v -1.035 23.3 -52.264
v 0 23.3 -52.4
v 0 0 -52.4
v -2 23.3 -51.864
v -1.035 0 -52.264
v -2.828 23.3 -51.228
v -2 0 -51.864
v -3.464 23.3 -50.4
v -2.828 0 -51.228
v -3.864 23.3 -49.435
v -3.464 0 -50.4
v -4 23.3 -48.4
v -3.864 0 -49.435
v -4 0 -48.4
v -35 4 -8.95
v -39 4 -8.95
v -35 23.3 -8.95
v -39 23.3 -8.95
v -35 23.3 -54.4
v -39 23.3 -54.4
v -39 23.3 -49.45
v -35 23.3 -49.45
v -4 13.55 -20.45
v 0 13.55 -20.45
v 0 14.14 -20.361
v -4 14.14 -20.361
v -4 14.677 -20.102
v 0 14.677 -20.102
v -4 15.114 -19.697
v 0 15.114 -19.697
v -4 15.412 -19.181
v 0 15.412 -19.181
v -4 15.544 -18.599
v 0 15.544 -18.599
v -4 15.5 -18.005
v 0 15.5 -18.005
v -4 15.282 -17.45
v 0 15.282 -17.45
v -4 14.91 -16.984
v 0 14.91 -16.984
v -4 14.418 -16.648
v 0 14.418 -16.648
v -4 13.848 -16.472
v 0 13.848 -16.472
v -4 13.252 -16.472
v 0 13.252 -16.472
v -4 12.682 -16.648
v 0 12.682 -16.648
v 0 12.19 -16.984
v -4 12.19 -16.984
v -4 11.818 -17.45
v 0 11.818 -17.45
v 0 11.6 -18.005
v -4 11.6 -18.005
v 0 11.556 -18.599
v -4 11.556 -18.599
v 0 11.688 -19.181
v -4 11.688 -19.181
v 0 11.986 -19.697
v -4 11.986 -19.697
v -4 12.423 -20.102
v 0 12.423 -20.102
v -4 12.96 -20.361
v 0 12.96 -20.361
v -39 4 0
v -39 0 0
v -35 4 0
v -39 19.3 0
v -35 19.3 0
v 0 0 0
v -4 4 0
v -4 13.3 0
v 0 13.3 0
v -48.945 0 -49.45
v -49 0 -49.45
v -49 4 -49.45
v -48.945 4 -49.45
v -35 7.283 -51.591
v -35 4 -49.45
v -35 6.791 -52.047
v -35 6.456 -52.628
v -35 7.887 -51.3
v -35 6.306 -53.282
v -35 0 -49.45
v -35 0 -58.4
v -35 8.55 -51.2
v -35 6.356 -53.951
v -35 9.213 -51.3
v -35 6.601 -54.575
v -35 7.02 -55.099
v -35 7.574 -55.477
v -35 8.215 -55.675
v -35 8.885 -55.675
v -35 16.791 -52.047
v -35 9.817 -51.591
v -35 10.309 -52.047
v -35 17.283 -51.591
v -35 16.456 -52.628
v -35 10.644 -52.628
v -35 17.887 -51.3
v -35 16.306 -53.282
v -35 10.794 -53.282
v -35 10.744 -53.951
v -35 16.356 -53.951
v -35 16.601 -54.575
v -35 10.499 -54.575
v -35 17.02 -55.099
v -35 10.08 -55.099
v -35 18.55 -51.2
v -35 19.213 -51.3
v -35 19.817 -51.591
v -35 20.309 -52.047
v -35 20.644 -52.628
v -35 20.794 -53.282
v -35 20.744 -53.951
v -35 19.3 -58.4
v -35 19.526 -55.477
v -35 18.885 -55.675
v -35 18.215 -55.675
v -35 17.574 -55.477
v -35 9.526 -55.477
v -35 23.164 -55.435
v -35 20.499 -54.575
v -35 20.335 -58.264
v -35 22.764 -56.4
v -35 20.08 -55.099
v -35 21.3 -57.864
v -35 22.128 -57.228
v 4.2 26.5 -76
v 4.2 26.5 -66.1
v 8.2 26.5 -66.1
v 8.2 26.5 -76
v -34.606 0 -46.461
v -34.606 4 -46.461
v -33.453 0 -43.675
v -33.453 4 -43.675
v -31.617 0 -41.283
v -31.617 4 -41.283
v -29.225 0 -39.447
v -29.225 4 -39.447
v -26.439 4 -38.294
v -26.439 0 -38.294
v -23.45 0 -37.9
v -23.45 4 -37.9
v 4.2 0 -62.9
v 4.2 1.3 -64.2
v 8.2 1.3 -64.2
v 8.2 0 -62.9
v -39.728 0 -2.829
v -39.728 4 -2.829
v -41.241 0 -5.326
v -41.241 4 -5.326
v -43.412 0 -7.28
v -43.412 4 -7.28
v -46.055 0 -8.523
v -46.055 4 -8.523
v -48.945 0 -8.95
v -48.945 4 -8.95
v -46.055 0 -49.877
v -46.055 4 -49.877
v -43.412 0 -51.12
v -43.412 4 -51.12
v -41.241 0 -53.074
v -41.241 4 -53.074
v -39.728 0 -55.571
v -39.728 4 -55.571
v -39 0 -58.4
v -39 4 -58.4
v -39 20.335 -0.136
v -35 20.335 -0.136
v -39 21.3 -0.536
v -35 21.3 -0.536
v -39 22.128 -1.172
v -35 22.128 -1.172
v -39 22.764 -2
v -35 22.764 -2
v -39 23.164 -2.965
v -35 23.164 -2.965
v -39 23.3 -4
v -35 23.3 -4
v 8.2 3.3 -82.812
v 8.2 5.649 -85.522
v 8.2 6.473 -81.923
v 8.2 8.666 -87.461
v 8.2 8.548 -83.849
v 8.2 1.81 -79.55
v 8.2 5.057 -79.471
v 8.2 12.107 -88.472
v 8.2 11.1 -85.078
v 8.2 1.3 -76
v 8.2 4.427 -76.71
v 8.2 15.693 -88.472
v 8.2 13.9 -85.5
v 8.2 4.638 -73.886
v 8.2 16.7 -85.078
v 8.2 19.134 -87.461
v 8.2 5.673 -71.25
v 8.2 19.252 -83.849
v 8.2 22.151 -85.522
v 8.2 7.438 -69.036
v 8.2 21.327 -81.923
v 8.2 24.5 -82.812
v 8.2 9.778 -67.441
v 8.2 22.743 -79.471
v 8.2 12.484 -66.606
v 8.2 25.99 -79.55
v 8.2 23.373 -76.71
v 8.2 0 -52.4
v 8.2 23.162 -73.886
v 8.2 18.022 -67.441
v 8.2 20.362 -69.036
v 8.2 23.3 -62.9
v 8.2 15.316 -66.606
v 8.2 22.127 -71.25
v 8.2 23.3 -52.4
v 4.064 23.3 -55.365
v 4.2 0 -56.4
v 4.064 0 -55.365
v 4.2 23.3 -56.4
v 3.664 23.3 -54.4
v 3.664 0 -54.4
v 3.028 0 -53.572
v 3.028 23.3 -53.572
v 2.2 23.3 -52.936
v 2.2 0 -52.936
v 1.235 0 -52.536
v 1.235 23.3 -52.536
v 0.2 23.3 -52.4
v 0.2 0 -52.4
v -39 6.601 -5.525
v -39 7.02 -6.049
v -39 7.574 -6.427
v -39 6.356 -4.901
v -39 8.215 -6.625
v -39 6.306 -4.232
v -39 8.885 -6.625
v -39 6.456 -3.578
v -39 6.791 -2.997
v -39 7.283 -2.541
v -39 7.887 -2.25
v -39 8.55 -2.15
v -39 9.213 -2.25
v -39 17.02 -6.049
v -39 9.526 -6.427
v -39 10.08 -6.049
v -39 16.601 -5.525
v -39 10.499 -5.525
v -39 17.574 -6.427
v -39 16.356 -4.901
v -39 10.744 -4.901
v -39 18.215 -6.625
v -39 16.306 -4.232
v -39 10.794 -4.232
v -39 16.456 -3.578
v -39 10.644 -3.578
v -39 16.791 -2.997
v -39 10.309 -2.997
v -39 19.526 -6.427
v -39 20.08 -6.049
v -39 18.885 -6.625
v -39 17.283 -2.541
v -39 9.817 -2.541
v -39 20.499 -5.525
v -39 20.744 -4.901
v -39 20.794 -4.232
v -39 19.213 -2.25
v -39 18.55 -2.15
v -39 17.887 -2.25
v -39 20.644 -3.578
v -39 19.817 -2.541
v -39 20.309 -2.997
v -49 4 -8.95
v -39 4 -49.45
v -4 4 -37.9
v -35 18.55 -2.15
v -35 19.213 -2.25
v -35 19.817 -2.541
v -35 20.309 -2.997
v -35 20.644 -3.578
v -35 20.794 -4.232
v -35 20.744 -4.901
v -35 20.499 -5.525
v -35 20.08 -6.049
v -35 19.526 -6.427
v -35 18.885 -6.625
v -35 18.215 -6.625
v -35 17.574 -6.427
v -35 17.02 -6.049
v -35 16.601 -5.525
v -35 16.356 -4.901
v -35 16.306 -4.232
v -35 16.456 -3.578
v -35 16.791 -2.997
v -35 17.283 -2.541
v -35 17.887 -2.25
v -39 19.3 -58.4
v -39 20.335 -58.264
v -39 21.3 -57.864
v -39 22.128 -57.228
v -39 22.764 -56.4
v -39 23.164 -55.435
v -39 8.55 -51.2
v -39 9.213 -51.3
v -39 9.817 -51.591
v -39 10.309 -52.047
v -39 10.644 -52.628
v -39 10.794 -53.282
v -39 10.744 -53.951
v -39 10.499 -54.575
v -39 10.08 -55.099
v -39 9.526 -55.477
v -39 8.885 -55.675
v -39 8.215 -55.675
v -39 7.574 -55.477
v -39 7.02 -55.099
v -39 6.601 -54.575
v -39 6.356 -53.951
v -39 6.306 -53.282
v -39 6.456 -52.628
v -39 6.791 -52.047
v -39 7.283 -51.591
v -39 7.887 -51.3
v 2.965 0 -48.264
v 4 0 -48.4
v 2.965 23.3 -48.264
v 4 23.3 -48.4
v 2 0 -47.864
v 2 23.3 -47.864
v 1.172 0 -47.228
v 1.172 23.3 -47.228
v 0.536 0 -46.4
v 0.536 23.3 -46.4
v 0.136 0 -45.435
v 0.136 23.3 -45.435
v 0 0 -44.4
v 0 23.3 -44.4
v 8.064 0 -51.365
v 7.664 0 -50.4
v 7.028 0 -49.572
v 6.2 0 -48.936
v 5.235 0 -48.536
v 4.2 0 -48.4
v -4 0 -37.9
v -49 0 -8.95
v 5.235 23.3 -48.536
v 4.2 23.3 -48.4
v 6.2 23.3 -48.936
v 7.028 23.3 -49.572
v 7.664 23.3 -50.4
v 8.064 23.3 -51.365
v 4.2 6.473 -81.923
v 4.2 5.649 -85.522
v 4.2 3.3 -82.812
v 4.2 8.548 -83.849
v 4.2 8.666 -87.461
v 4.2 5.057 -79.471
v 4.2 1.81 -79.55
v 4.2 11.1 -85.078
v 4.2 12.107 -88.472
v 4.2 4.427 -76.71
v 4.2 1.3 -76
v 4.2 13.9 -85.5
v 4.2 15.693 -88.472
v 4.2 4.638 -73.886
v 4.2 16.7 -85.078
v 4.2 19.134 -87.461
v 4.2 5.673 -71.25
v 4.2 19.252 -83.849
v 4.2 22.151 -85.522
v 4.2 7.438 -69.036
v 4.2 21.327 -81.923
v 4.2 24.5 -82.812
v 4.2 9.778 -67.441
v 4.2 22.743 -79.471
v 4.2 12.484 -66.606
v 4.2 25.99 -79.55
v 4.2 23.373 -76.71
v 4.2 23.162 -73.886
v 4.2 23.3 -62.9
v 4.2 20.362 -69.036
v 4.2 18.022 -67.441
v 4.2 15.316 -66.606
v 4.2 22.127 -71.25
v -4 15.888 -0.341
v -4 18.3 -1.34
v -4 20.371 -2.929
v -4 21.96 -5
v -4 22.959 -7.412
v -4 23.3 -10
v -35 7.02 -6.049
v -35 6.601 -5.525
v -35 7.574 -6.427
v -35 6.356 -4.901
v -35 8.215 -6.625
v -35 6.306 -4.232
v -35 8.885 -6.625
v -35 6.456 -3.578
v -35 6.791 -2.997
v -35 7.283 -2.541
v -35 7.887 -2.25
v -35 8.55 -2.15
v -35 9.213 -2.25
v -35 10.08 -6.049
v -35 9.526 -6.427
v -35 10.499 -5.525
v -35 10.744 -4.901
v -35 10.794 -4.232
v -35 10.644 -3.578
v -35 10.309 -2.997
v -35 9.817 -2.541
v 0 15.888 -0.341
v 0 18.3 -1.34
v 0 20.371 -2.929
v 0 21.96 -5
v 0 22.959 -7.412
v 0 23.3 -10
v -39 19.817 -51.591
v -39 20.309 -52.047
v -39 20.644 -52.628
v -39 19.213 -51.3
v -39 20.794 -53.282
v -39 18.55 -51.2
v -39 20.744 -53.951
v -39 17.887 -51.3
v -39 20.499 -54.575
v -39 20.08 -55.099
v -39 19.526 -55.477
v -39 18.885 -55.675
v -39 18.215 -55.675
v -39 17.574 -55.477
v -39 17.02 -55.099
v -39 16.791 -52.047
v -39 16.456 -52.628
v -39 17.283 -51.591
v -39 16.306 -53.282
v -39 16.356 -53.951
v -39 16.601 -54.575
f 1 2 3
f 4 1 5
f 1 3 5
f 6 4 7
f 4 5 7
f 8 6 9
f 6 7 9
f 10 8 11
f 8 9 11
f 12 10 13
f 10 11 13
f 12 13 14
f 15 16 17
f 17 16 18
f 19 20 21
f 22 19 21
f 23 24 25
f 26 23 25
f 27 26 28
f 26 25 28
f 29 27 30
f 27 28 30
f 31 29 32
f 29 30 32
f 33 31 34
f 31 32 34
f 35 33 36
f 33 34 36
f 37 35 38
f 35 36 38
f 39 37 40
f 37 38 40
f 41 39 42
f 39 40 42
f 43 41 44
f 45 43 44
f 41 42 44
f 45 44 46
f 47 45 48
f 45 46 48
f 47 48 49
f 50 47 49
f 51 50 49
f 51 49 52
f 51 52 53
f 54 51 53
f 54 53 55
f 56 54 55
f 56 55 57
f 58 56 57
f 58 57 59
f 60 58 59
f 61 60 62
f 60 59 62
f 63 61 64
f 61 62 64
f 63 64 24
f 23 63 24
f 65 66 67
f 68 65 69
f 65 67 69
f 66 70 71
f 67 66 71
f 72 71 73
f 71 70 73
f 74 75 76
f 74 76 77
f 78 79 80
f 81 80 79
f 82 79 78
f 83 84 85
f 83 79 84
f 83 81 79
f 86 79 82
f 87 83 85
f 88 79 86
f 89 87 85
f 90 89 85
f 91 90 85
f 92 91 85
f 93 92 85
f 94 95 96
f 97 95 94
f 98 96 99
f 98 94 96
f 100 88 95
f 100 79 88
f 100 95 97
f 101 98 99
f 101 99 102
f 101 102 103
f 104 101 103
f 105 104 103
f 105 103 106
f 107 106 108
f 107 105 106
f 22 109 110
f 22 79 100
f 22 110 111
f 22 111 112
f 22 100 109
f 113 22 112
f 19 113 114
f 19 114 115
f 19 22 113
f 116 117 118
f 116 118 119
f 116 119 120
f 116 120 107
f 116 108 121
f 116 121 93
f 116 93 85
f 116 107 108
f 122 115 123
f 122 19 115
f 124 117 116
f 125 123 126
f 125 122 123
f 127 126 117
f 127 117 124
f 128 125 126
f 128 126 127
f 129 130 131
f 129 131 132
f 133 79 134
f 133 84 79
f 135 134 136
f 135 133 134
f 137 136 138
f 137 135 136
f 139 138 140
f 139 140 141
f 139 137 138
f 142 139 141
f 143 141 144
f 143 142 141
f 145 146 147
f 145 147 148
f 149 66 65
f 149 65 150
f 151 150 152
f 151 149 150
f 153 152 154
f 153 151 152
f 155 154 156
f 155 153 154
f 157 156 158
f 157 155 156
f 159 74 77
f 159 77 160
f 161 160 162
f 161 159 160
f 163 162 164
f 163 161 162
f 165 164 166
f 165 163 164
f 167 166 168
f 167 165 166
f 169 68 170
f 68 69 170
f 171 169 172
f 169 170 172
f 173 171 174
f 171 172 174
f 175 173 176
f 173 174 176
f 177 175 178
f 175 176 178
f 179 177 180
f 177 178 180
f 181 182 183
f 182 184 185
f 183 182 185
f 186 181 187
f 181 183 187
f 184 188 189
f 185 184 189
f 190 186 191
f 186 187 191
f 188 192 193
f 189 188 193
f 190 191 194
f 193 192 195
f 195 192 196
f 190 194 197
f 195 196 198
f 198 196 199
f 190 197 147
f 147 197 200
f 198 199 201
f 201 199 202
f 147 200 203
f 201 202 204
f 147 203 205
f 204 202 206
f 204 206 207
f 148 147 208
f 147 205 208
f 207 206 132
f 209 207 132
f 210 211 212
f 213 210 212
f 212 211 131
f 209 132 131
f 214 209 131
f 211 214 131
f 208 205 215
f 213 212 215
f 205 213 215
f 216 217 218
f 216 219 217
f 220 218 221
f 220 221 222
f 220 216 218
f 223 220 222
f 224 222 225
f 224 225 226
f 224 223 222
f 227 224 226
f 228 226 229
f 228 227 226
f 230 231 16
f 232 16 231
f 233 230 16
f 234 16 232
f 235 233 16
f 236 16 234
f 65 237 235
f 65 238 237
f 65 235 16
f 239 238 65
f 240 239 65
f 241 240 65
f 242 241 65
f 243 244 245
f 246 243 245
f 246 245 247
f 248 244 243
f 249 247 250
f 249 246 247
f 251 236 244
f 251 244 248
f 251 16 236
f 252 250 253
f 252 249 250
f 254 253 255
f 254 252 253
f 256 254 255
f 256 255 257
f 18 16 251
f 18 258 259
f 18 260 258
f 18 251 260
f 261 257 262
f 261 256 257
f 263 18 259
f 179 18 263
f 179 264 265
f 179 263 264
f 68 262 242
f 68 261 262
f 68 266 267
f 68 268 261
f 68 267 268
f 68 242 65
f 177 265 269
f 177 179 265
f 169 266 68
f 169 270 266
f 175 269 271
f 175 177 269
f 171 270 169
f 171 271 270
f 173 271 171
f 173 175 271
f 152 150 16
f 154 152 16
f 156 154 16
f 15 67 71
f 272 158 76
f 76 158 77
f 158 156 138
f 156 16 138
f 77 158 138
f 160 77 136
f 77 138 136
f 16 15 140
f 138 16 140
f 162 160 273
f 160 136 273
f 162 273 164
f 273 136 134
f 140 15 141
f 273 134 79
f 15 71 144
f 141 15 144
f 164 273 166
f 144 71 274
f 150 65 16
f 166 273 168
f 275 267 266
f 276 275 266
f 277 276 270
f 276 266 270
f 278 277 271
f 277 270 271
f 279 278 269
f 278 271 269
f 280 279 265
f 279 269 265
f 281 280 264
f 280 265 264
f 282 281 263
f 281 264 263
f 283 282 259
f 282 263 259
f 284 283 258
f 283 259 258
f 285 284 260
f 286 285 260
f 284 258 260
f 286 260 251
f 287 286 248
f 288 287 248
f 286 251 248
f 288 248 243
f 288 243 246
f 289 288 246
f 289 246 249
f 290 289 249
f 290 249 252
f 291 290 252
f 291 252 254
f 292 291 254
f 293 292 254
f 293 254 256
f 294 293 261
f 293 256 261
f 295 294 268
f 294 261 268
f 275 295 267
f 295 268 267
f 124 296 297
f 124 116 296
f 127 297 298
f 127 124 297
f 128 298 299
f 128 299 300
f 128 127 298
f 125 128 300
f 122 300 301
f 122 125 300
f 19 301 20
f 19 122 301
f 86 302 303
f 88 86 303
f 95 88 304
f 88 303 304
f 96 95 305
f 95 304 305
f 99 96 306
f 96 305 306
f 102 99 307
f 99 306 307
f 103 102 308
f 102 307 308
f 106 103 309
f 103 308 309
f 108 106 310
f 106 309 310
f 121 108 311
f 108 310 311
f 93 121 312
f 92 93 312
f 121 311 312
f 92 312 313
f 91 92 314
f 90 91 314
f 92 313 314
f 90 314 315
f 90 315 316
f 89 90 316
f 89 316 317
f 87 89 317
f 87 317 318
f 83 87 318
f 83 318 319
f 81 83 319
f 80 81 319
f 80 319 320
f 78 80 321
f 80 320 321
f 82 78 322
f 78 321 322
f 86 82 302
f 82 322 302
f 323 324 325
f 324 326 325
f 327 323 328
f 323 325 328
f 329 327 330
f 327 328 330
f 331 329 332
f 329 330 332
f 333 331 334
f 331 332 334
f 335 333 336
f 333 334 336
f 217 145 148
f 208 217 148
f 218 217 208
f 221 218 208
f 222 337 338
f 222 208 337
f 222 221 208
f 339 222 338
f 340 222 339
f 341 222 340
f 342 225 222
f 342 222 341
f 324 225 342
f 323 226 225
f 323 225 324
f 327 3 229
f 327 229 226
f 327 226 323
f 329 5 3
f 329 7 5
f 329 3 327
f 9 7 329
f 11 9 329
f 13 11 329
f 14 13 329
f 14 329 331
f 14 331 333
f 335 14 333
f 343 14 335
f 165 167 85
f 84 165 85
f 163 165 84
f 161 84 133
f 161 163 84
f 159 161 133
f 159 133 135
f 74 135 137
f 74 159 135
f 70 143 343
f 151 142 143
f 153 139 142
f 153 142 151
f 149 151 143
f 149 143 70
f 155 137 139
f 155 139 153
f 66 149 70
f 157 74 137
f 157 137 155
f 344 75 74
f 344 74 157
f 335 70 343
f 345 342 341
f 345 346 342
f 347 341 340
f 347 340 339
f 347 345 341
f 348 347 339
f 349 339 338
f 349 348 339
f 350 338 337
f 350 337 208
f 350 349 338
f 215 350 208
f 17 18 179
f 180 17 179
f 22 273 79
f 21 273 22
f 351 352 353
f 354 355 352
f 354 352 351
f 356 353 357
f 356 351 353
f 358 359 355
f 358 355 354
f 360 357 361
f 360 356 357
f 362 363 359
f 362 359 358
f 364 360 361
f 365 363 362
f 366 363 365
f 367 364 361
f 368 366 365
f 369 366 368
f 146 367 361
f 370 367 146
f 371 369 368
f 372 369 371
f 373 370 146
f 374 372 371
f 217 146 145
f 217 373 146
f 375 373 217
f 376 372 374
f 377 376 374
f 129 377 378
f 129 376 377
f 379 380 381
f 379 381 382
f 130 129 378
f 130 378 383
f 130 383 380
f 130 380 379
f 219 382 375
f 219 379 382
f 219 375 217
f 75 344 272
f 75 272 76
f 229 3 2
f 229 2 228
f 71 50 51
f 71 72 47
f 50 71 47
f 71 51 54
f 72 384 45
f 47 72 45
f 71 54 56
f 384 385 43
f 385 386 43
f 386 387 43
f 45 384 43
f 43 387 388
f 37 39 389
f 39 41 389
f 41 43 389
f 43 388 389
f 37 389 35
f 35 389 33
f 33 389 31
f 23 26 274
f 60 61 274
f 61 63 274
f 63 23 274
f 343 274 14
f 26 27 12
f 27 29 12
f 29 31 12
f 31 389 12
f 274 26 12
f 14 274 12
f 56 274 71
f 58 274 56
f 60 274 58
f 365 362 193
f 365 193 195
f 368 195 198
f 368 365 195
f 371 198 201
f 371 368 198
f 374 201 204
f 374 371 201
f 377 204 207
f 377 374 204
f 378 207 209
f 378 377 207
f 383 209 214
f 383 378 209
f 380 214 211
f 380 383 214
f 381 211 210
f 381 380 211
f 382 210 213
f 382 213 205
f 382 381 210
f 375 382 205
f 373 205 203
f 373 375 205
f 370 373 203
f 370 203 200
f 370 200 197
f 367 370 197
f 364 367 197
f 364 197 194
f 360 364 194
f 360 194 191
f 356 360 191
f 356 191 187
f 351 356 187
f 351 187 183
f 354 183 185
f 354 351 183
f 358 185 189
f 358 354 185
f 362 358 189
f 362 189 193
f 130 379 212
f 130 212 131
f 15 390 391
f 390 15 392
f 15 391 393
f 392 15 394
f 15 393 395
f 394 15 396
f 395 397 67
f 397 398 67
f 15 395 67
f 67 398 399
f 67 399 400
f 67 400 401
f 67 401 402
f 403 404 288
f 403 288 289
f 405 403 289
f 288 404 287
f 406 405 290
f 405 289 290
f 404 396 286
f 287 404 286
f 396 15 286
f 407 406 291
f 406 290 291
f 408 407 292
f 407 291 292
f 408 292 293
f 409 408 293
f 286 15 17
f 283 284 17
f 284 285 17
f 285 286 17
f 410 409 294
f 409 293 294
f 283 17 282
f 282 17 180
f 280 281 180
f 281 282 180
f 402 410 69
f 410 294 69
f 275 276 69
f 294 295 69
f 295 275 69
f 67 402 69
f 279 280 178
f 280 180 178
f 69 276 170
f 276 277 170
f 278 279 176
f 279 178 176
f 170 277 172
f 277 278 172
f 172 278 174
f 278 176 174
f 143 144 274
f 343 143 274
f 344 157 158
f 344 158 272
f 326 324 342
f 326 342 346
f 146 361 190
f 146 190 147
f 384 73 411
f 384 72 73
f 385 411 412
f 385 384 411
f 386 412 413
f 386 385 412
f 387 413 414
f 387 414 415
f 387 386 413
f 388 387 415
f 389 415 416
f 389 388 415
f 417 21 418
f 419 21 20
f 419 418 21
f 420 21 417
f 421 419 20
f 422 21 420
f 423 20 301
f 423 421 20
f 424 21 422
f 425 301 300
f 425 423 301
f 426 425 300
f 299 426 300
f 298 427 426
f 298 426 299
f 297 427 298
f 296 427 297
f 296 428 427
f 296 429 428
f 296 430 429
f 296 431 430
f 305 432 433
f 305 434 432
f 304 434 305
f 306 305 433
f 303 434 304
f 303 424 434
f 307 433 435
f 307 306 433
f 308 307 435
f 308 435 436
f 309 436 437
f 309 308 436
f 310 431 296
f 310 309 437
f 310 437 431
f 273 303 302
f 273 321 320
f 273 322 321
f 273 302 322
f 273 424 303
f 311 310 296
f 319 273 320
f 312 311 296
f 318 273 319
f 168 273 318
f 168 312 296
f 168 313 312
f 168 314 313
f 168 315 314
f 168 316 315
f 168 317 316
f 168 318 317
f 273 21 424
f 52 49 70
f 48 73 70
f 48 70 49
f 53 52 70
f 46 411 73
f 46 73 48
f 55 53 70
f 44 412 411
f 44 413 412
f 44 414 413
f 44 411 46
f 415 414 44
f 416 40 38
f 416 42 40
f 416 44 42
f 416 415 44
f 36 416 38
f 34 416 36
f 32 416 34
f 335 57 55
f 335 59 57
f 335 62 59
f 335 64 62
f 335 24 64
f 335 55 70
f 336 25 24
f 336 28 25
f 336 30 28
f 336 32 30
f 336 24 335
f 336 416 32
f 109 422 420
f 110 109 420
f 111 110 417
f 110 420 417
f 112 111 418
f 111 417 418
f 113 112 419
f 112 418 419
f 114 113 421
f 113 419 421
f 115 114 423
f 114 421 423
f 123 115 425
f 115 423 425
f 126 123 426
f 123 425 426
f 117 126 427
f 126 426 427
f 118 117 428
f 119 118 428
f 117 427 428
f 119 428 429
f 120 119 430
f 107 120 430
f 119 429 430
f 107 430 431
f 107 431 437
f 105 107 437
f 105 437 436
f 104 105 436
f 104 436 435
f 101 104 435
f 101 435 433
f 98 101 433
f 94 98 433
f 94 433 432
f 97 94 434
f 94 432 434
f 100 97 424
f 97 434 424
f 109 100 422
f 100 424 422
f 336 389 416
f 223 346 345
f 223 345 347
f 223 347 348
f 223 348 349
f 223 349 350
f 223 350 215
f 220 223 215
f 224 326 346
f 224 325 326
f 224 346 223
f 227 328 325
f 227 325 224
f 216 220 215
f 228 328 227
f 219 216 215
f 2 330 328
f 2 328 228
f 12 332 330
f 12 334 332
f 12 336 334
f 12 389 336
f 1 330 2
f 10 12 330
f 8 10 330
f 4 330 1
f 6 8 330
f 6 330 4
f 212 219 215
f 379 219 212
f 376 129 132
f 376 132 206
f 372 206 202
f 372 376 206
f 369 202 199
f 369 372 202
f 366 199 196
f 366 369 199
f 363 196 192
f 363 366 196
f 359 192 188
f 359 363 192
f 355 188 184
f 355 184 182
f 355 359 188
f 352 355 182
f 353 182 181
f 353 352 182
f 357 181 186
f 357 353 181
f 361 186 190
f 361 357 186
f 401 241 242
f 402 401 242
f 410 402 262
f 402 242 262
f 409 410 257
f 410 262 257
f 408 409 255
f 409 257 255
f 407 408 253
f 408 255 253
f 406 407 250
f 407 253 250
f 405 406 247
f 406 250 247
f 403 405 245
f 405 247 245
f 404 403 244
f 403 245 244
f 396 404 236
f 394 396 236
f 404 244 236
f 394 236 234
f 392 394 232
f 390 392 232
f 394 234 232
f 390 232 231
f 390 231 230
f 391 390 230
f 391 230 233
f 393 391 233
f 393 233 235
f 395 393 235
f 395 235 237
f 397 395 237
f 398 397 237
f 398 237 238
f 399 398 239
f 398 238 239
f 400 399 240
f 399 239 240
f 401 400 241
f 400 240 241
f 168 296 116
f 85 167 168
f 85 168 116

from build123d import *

# Parameters (mm, degrees)
BOSS_EXTRUDE1_DEPTH = 4
SKETCH2_W           = 8.95
SKETCH2_H           = 19.3
SKETCH2_R           = 2.25
BOSS_EXTRUDE2_DEPTH = 4
FILLET1_R           = 10
FILLET2_R           = 4
SKETCH3_W           = 52.4
SKETCH3_H           = 19.3
SKETCH3_R           = 2
BOSS_EXTRUDE3_DEPTH = 4
FILLET3_R           = 10
SKETCH4_W           = 31
SKETCH4_H           = 20.5
CUT_EXTRUDE1_DEPTH  = 10
SKETCH5_W           = 4
SKETCH5_H           = 6
CUT_EXTRUDE2_DEPTH  = 10
FILLET4_R           = 11.55
SKETCH6_W           = 4.2
SKETCH6_H           = 4
BOSS_EXTRUDE4_DEPTH = 23.3
SKETCH7_R           = 9.5
BOSS_EXTRUDE5_DEPTH = 4
FILLET6_R           = 4


with BuildPart() as part:
    # Sketch1 → Boss-Extrude1 (new body)
    with BuildSketch(Plane(origin=(0, 0, 0), x_dir=(1, 0, 0), z_dir=(0, 1, 0))):
        Polygon((-49, 49.45), (-39, 49.45), (-39, 58.4), (0, 58.4), (0, 0), (-39, 0), (-39, 8.95), (-49, 8.95), align=None)
    extrude(amount=BOSS_EXTRUDE1_DEPTH)

    # Sketch2 → Boss-Extrude2 (add)
    # profile 1 of 2: a face of its own
    with BuildSketch(Plane.ZY.offset(39)):
        with Locations((-4.475, 13.65)):
            Rectangle(SKETCH2_W, SKETCH2_H)
        with Locations((-4.4, 18.55)):
            Circle(SKETCH2_R, mode=Mode.SUBTRACT)
        with Locations((-4.4, 8.55)):
            Circle(SKETCH2_R, mode=Mode.SUBTRACT)
    # profile 2 of 2: a face of its own
    with BuildSketch(Plane.ZY.offset(39)):
        with Locations((-53.925, 13.65)):
            Rectangle(SKETCH2_W, SKETCH2_H)
        with Locations((-53.45, 18.55)):
            Circle(SKETCH2_R, mode=Mode.SUBTRACT)
        with Locations((-53.45, 8.55)):
            Circle(SKETCH2_R, mode=Mode.SUBTRACT)
    extrude(amount=-BOSS_EXTRUDE2_DEPTH)

    # Fillet1
    # the kernel refuses this fillet: 10 mm, written as the material it adds along each edge
    with BuildSketch(Plane(origin=(-39, 0, -49.45), x_dir=(-1, 0, 0), z_dir=(0, 1, 0))) as fillet1_piece_1:
        with BuildLine():
            CenterArc((9.944722218, -10), FILLET1_R, 90, 83.97283344)
            Line((0, -8.95), (0, 0))
            Line((0, 0), (9.944722218, 0))
        make_face()
    extrude(amount=4)
    with BuildSketch(Plane(origin=(-39, 0, -8.95), x_dir=(0, 0, 1), z_dir=(0, 1, 0))) as fillet1_piece_2:
        with BuildLine():
            CenterArc((10, -9.944722218), FILLET1_R, 96.02716656, 83.97283344)
            Line((0, -9.944722218), (0, 0))
            Line((0, 0), (8.95, 0))
        make_face()
    extrude(amount=4)

    # Fillet2
    fillet2_edges = [part.edges().sort_by_distance(p)[0] for p in [
        (-37, 23.3, 0),
        (-37, 23.3, -58.4),
    ]]
    fillet(fillet2_edges, radius=FILLET2_R)

    # Sketch3 → Boss-Extrude3 (add)
    with BuildSketch(Plane(origin=(0, 0, 0), x_dir=(0, 0, -1), z_dir=(1, 0, 0))):
        with Locations((26.2, 13.65)):
            Rectangle(SKETCH3_W, SKETCH3_H)
        with Locations((18.45, 13.55)):
            Circle(SKETCH3_R, mode=Mode.SUBTRACT)
    extrude(amount=-BOSS_EXTRUDE3_DEPTH)

    # Fillet3
    fillet3_edges = [part.edges().sort_by_distance(p)[0] for p in [
        (-2, 23.3, 0),
    ]]
    fillet(fillet3_edges, radius=FILLET3_R)

    # Sketch4 → Cut-Extrude1 (cut)
    with BuildSketch(Plane(origin=(0, 4, 0), x_dir=(1, 0, 0), z_dir=(0, 1, 0))):
        with Locations((-19.5, 48.15)):
            Rectangle(SKETCH4_W, SKETCH4_H)
    extrude(amount=-CUT_EXTRUDE1_DEPTH, mode=Mode.SUBTRACT)

    # Sketch5 → Cut-Extrude2 (cut)
    with BuildSketch(Plane(origin=(0, 4, 0), x_dir=(1, 0, 0), z_dir=(0, 1, 0))):
        with Locations((-2, 55.4)):
            Rectangle(SKETCH5_W, SKETCH5_H)
    extrude(amount=-CUT_EXTRUDE2_DEPTH, mode=Mode.SUBTRACT)

    # Fillet4
    fillet4_edges = [part.edges().sort_by_distance(p)[0] for p in [
        (-35, 2, -37.9),
    ]]
    fillet(fillet4_edges, radius=FILLET4_R)

    # Sketch6 → Boss-Extrude4 (add)
    with BuildSketch(Plane.XZ):
        with Locations((2.1, -50.4)):
            Rectangle(SKETCH6_W, SKETCH6_H)
    extrude(amount=-BOSS_EXTRUDE4_DEPTH)

    # Sketch7 → Boss-Extrude5 (add)
    with BuildSketch(Plane(origin=(4.2, 0, 0), x_dir=(0, 0, -1), z_dir=(1, 0, 0))):
        with BuildLine():
            Line((48.4, 0), (48.4, 23.3))
            Line((48.4, 23.3), (62.9, 23.3))
            Line((62.9, 23.3), (66.1, 26.5))
            Line((66.1, 26.5), (76, 26.5))
            ThreePointArc((76, 26.5), (88.6, 13.9), (76, 1.3))
            Line((76, 1.3), (64.2, 1.3))
            Line((64.2, 1.3), (62.9, 0))
            Line((62.9, 0), (48.4, 0))
        make_face()
        with Locations((76, 13.9)):
            Circle(SKETCH7_R, mode=Mode.SUBTRACT)
    extrude(amount=BOSS_EXTRUDE5_DEPTH)

    # Fillet6
    fillet6_edges = [part.edges().sort_by_distance(p)[0] for p in [
        (4.2, 11.65, -52.4),
        (0, 11.65, -48.4),
        (8.2, 11.65, -48.4),
        (-4, 11.65, -52.4),
    ]]
    fillet(fillet6_edges, radius=FILLET6_R)


solid = part.part
